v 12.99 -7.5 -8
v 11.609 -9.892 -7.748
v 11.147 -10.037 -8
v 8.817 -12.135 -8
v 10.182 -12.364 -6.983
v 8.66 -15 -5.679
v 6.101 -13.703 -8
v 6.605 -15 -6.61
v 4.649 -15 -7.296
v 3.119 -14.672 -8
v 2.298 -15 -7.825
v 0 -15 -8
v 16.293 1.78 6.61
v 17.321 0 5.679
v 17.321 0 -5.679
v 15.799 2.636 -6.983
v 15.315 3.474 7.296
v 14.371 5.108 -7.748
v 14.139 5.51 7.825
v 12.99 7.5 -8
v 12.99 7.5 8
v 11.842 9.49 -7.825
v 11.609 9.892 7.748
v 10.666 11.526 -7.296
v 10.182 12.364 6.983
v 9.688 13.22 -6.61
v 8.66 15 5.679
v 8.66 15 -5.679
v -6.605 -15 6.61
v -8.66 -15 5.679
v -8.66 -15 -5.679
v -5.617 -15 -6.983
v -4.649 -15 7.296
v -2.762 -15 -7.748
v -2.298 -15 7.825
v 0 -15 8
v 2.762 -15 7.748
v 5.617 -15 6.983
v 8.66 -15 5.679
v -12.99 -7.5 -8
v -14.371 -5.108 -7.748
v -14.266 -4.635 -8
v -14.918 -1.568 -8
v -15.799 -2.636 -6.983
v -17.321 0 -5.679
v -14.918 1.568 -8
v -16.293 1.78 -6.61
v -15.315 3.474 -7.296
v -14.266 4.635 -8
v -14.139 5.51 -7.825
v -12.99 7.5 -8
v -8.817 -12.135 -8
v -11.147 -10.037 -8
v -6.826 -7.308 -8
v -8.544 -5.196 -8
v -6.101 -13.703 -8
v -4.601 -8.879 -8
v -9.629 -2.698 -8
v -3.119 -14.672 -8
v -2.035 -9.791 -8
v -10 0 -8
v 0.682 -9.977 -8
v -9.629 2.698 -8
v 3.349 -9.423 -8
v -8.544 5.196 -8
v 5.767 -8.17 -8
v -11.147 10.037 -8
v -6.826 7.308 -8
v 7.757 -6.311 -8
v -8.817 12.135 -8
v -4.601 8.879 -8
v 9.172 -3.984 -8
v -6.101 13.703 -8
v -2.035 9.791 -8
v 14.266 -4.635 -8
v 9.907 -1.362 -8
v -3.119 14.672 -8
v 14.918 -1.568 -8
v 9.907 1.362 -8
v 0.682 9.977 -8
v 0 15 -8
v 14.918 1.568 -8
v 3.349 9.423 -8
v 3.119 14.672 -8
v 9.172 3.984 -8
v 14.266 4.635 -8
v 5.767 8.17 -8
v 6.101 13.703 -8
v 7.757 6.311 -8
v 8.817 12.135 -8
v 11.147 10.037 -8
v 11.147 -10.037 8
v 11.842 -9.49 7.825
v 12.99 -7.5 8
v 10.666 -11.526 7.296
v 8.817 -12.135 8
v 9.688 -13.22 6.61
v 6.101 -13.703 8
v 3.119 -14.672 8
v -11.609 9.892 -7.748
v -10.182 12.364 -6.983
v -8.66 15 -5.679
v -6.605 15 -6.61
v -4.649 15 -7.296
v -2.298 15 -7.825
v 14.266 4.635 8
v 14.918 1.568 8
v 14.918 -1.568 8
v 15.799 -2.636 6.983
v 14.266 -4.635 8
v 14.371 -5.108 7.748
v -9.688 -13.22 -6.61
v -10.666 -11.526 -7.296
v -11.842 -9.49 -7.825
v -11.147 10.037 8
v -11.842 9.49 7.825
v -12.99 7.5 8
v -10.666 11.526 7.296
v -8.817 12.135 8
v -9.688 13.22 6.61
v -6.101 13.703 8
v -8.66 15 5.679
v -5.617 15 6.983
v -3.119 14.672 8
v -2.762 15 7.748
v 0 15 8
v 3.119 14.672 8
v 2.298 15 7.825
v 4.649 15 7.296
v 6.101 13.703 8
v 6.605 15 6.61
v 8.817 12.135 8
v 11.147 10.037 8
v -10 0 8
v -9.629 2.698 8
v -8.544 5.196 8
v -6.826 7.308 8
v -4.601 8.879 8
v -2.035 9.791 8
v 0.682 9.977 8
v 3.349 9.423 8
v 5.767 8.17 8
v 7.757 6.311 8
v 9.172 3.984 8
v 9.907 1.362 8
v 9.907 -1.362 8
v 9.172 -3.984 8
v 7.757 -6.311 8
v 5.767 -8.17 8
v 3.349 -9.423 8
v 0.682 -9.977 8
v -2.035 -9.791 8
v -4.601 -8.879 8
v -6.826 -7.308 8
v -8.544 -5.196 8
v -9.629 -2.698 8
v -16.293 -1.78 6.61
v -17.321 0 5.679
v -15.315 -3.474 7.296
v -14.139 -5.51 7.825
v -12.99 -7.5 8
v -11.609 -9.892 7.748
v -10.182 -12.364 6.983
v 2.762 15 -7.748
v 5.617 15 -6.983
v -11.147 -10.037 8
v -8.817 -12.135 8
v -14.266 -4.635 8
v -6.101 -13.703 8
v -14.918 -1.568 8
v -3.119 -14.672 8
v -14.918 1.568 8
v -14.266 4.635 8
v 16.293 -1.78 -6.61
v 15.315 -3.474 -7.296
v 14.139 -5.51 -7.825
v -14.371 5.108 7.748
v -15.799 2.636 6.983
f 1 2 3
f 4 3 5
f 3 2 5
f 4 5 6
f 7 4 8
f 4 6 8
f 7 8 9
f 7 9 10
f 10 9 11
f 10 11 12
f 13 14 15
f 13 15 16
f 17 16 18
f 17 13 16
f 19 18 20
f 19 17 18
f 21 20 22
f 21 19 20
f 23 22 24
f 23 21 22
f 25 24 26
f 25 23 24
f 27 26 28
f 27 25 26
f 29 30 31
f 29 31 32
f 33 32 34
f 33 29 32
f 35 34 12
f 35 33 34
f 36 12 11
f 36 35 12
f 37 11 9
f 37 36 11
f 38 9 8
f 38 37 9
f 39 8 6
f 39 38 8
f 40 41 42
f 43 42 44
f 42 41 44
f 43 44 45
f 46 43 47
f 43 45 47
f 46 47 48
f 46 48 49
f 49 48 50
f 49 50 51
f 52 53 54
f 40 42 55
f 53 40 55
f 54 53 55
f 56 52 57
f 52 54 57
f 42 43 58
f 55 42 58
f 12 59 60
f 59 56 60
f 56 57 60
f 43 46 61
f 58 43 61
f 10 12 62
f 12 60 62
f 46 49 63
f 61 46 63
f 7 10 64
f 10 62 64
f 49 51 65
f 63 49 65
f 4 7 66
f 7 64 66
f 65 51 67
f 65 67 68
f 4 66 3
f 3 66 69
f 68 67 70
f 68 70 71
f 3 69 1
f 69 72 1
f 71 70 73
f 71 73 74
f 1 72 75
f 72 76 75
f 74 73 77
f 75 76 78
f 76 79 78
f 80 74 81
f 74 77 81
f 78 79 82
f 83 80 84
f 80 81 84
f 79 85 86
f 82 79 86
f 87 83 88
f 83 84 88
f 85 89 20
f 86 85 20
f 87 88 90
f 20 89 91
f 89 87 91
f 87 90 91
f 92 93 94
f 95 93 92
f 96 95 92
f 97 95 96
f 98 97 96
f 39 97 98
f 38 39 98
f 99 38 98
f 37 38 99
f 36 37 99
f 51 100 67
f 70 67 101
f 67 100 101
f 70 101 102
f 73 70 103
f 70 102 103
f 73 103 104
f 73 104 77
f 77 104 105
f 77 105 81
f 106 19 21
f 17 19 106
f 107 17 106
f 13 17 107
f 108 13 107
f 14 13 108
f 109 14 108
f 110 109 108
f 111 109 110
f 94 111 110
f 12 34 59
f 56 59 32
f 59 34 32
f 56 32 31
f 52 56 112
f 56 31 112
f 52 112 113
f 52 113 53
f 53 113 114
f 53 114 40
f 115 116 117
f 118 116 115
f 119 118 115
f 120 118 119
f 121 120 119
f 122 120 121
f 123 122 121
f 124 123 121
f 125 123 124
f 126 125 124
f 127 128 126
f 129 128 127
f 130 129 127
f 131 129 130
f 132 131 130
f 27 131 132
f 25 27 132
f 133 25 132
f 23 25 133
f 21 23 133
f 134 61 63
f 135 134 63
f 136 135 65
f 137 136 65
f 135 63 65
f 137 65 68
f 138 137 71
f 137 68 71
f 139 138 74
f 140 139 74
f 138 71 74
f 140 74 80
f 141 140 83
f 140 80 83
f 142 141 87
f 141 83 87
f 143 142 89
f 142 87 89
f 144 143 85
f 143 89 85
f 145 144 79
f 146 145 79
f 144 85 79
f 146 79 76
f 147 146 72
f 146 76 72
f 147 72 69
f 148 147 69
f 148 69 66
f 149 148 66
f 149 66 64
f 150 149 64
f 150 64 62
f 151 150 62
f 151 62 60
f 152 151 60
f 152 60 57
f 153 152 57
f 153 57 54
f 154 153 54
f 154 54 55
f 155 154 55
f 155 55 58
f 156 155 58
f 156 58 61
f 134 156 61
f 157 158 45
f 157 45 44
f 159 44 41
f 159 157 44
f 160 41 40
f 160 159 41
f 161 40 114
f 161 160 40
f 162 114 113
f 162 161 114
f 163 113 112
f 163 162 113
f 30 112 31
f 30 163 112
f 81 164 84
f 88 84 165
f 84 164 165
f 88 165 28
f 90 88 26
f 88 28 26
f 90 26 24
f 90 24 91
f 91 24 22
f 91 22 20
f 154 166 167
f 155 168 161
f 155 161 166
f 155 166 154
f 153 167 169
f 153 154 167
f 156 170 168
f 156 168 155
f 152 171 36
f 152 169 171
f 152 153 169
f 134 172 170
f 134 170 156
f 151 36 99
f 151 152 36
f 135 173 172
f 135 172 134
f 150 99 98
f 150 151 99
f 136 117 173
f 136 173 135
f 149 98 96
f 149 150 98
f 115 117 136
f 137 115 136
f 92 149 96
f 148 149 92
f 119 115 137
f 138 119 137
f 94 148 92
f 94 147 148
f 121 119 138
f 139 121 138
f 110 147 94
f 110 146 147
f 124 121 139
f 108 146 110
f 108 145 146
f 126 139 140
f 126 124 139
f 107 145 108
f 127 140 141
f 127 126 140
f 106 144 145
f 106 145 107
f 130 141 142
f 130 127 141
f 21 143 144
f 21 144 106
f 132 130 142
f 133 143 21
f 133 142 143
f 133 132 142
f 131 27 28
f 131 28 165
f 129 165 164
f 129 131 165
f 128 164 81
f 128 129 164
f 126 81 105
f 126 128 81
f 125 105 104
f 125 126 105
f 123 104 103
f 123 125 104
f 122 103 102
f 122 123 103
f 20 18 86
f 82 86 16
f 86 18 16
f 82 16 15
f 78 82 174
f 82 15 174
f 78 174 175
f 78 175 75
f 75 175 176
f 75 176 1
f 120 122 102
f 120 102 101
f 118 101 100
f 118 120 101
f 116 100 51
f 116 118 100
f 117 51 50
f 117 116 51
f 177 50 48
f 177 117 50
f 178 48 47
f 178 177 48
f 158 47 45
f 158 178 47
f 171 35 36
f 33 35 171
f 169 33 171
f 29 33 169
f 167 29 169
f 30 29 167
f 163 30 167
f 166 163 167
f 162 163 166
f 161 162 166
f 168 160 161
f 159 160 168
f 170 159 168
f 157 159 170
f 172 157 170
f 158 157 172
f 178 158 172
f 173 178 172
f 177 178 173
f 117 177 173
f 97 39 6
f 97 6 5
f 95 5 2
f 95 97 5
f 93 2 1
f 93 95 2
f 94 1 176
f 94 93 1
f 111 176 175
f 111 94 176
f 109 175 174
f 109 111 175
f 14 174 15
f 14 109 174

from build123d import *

# Parameters (mm, degrees)
BOSS_EXTRUDE1_DEPTH = 8
SKETCH2_OUTSIDE_W   = 80.35
SKETCH2_OUTSIDE_H   = 75.708
SKETCH2_OUTSIDE_R   = 15
CUT_EXTRUDE1_DEPTH  = 17
CUT_EXTRUDE1_TAPER  = 45
SKETCH3_R           = 10
CUT_EXTRUDE2_DEPTH  = 17


with BuildPart() as part:
    # Sketch1 → Boss-Extrude1 (new body, symmetric)
    with BuildSketch(Plane.XY):
        Polygon((-8.660254038, 15), (-17.320508076, 0), (-8.660254038, -15), (8.660254038, -15), (17.320508076, 0), (8.660254038, 15), align=None)
    extrude(amount=BOSS_EXTRUDE1_DEPTH, both=True)

    # Sketch2 outside → Cut-Extrude1 (cut, through all)
    with BuildSketch(Plane.XY.offset(8)):
        Rectangle(SKETCH2_OUTSIDE_W, SKETCH2_OUTSIDE_H)
        Circle(SKETCH2_OUTSIDE_R, mode=Mode.SUBTRACT)
    cut_extrude1 = extrude(amount=-CUT_EXTRUDE1_DEPTH, taper=CUT_EXTRUDE1_TAPER, mode=Mode.SUBTRACT)

    # Mirror1: Cut-Extrude1 across plane
    add(cut_extrude1.mirror(Plane.XY), mode=Mode.SUBTRACT)

    # Sketch3 → Cut-Extrude2 (cut, through all)
    with BuildSketch(Plane(origin=(0, 0, -8), x_dir=(-1, 0, 0), z_dir=(0, 0, -1))):
        Circle(SKETCH3_R)
    extrude(amount=-CUT_EXTRUDE2_DEPTH, mode=Mode.SUBTRACT)


solid = part.part
